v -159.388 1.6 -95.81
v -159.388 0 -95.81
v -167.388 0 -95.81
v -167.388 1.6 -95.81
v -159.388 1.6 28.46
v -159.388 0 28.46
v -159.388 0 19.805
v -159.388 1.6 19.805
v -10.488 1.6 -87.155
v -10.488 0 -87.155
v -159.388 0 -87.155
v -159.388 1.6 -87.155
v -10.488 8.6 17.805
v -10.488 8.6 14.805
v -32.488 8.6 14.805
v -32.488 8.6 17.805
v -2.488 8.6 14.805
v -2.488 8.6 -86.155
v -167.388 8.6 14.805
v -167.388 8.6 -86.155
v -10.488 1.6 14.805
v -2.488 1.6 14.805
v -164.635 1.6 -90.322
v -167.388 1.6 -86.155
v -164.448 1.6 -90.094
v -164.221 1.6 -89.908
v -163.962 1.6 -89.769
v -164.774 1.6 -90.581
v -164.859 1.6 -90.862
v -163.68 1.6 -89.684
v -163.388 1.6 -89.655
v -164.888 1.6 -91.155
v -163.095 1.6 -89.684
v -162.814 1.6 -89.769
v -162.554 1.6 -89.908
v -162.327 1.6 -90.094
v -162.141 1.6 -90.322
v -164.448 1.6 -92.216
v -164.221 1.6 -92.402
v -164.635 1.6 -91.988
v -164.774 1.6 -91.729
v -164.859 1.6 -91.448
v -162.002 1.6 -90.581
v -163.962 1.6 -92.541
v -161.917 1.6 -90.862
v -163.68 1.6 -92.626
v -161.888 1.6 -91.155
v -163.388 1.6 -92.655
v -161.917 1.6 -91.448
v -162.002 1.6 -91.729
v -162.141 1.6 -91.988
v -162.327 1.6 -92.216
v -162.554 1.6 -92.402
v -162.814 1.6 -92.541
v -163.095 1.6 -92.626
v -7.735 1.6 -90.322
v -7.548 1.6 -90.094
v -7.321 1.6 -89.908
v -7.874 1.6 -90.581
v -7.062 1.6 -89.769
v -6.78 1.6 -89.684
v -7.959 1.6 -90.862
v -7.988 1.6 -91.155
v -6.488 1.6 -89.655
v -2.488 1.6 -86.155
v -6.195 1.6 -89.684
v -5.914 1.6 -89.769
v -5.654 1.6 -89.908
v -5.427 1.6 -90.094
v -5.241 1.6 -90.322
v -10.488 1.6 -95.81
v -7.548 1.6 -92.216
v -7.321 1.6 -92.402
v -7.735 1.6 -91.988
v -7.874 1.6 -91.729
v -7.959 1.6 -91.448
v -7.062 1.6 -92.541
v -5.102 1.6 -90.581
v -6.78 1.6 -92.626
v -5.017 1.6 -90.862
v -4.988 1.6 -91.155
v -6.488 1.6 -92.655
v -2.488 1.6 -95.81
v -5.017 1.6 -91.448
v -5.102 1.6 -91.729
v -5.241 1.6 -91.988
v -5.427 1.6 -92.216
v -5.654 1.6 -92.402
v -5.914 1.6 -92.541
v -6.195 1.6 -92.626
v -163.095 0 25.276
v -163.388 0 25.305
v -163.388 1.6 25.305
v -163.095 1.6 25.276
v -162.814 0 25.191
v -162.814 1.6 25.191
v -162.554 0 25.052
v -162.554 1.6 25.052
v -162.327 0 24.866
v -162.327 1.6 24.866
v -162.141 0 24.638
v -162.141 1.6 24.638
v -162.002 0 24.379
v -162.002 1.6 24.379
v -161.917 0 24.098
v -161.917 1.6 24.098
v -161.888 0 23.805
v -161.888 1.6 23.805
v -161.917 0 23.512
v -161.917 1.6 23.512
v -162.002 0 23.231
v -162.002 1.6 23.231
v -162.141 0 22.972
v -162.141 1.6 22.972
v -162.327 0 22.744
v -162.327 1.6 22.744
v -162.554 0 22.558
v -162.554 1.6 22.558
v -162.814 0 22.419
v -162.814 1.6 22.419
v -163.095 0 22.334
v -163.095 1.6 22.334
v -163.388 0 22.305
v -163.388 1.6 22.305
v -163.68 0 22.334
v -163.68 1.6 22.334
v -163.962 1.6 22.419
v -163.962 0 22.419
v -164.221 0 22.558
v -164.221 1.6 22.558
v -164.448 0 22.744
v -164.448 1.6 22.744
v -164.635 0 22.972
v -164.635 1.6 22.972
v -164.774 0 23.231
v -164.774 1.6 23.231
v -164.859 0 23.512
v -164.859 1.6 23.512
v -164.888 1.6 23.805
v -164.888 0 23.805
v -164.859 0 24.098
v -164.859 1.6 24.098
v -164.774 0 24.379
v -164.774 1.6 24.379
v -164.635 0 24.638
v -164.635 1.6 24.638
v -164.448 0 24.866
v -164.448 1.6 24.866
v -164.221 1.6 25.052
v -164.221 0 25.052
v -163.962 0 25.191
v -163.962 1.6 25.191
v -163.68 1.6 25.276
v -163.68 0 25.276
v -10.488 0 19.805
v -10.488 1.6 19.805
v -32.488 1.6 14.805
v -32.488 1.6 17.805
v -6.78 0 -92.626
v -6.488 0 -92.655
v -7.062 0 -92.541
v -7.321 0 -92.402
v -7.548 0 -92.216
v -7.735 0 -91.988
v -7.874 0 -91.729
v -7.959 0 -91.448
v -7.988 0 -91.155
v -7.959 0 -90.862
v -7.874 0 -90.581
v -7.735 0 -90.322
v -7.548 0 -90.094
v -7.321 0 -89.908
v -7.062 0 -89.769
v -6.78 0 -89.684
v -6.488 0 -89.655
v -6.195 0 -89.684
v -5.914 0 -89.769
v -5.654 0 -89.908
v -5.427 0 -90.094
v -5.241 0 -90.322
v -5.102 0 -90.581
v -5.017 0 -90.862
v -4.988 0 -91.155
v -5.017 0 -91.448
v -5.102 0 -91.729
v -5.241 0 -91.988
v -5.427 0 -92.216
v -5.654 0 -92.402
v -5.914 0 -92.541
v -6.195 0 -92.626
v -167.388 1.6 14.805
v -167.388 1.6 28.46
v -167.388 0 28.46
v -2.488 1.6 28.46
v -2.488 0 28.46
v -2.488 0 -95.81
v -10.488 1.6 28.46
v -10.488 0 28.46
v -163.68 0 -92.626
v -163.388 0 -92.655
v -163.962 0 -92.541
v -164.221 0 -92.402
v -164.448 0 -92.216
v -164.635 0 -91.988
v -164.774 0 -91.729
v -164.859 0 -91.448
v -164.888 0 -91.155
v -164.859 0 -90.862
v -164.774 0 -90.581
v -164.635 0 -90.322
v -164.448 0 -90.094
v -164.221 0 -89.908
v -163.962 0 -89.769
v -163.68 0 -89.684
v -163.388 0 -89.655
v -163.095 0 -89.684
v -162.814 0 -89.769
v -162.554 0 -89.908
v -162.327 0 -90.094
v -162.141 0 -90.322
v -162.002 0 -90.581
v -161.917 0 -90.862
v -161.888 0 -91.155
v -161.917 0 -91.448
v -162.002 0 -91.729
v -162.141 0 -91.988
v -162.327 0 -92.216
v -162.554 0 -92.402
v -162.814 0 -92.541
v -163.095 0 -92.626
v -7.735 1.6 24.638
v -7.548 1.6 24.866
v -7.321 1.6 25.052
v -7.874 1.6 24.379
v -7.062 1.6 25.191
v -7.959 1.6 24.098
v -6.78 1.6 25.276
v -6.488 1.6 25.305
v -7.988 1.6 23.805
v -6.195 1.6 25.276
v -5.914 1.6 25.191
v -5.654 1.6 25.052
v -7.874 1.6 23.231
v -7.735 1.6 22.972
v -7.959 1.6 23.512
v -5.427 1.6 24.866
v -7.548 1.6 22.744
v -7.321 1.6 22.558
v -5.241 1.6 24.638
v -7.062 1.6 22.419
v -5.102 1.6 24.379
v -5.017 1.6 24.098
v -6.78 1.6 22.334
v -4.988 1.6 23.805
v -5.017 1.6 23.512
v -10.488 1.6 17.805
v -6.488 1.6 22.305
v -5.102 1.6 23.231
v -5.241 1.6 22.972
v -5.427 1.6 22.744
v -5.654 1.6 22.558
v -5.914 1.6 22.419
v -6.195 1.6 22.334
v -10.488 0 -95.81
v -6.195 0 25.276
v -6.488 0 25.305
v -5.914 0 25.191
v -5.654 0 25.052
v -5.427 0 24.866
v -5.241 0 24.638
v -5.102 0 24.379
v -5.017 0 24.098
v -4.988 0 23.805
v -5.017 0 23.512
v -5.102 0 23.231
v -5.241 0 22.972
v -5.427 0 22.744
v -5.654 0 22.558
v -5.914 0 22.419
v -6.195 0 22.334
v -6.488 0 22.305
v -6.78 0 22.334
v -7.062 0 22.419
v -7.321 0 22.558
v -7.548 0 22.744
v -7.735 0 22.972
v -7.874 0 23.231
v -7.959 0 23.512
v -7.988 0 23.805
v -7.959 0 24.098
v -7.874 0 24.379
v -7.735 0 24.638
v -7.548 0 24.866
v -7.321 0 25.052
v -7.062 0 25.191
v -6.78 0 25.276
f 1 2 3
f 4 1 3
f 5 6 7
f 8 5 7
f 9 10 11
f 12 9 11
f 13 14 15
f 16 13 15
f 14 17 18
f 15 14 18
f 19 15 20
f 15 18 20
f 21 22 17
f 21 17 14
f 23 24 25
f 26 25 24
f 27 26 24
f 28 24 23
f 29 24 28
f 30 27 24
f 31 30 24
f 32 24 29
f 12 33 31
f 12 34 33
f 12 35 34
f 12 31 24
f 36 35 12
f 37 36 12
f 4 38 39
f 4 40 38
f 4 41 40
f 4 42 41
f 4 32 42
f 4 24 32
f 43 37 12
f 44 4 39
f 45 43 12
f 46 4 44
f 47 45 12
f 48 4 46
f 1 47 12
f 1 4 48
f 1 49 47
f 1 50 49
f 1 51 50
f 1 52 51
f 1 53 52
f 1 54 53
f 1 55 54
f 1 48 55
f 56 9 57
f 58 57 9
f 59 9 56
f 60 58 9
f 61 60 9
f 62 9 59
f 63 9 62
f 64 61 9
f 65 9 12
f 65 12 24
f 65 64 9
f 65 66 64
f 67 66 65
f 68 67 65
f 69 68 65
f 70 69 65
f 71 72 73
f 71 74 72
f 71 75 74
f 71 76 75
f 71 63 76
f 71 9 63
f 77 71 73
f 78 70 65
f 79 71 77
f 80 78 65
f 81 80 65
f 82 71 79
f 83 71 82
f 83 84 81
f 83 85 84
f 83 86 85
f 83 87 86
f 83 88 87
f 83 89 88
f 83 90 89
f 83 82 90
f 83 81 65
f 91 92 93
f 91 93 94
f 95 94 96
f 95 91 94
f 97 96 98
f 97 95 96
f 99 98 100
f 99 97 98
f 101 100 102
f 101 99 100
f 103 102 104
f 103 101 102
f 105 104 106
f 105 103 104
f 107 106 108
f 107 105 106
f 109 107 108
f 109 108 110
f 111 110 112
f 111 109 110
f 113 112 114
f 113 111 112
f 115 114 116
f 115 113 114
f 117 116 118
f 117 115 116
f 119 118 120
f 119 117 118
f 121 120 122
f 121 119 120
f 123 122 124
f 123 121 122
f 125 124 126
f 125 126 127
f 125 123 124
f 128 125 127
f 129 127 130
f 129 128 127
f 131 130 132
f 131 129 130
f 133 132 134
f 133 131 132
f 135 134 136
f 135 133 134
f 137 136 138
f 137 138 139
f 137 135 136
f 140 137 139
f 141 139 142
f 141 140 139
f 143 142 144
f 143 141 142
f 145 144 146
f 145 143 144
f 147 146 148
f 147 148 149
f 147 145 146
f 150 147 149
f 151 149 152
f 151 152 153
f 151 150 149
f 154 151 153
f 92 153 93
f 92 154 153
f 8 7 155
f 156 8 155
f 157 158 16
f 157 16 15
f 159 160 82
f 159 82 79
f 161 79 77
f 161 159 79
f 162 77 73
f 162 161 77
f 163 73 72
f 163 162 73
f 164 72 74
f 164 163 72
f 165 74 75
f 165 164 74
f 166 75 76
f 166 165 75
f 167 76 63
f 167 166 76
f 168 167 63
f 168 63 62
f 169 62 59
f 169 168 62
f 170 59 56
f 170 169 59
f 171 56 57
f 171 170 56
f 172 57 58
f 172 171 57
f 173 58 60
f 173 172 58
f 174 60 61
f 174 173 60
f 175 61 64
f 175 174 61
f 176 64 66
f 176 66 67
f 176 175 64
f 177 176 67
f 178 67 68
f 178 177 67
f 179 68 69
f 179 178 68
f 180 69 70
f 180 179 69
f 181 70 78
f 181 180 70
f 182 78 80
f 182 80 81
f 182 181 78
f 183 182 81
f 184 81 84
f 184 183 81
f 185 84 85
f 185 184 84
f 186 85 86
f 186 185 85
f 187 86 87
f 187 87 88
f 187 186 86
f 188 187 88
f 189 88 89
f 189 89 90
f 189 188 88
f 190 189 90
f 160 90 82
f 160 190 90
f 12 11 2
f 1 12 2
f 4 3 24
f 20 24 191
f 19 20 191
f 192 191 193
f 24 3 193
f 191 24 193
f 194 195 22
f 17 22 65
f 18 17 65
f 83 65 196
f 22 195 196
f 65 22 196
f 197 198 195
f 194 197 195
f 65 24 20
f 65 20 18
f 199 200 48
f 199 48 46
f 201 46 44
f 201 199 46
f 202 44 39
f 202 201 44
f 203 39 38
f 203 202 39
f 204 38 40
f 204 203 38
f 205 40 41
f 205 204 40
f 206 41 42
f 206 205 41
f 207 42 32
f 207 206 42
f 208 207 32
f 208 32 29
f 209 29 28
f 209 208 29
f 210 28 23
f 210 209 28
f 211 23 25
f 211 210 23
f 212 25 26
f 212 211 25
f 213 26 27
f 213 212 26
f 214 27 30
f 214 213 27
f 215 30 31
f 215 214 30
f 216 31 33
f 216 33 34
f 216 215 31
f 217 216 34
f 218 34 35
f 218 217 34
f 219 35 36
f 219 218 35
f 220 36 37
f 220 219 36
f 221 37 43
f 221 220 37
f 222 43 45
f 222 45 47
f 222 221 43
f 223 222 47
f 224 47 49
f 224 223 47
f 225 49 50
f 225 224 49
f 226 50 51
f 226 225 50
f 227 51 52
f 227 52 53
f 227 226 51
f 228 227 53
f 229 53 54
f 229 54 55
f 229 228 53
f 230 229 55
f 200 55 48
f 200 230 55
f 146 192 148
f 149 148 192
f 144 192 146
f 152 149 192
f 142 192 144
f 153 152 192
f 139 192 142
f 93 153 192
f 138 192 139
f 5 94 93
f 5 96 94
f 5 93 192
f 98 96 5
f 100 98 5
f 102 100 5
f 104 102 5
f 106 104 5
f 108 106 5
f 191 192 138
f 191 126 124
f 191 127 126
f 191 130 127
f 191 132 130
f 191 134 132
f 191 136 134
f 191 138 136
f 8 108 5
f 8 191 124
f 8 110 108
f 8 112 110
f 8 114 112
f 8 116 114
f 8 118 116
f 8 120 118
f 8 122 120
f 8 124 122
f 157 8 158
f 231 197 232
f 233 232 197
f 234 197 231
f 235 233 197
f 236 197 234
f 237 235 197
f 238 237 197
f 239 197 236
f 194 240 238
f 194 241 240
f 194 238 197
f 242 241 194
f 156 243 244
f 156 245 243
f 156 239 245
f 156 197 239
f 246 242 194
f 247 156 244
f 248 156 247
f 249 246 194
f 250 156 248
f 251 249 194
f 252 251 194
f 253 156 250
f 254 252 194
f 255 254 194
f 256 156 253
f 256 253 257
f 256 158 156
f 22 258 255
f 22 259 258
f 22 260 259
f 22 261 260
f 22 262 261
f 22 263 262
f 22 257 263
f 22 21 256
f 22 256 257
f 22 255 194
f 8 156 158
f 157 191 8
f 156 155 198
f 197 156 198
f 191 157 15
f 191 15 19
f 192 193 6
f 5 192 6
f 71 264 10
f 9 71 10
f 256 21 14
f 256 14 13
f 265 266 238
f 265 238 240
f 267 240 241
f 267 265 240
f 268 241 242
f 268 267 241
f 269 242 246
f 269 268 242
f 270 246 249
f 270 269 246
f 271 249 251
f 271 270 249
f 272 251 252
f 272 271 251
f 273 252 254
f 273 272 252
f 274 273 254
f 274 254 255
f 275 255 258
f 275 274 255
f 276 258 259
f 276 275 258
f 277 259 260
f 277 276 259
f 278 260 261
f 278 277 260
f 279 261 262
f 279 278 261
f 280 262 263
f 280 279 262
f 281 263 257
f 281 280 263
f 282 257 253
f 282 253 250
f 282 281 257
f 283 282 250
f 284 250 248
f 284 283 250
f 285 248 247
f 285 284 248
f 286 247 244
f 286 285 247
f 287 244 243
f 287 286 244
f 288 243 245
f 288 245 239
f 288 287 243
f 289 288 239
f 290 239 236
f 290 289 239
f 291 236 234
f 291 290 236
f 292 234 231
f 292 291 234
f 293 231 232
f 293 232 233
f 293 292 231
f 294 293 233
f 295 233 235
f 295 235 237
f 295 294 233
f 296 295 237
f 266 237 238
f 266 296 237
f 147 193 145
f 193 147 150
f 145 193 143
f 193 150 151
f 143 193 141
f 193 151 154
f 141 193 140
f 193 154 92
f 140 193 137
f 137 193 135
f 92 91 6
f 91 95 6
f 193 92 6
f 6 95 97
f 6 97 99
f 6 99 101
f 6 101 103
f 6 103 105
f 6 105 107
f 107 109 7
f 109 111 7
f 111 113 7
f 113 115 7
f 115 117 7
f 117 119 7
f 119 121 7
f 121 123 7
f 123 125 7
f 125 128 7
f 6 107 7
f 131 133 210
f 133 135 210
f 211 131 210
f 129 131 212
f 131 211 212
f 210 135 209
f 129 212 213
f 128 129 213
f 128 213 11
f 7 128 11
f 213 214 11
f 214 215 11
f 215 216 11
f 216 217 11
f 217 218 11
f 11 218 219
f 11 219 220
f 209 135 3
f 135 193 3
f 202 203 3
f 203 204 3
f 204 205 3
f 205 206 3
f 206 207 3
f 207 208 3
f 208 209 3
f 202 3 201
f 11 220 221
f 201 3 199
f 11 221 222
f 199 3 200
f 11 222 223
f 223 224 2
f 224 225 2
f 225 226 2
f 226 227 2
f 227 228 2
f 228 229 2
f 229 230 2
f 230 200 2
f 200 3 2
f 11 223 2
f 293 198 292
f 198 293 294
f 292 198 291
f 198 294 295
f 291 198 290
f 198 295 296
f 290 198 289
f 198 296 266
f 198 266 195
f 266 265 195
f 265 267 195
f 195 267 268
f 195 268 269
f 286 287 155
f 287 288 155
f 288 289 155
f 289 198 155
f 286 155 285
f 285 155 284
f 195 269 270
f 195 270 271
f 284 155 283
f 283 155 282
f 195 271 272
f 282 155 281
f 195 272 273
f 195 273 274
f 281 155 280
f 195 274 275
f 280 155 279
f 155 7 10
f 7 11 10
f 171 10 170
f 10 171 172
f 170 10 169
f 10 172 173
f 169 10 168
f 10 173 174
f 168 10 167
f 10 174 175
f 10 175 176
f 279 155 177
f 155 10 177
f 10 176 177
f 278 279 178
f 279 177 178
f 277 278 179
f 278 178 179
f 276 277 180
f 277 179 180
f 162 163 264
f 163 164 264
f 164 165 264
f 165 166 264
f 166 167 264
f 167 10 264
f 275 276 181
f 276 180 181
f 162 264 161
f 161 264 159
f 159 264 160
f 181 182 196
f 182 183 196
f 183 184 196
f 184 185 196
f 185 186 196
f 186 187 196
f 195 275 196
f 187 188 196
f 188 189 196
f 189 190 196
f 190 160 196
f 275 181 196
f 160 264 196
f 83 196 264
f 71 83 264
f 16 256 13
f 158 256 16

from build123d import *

# Parameters (mm, degrees)
SKETCH1_R           = 1.5
BOSS_EXTRUDE1_DEPTH = 1.6
BOSS_EXTRUDE2_DEPTH = 7


with BuildPart() as part:
    # Sketch1 → Boss-Extrude1 (new body)
    with BuildSketch(Plane(origin=(0, 0, 0), x_dir=(1, 0, 0), z_dir=(0, 1, 0))):
        Polygon((-167.387715517, 87.155002586), (-167.387715517, -19.804997414), (-167.387715517, -28.459997414), (-159.387715517, -28.459997414), (-159.387715517, -19.804997414), (-10.487715517, -19.804997414), (-10.487715517, -28.459997414), (-2.487715517, -28.459997414), (-2.487715517, -19.804997414), (-2.487715517, 87.155002586), (-2.487715517, 95.810002586), (-10.487715517, 95.810002586), (-10.487715517, 87.155002586), (-159.387715517, 87.155002586), (-159.387715517, 95.810002586), (-167.387715517, 95.810002586), align=None)
        with Locations(Location((-6.487715517, -23.804997414, 0), (0, 0, 270))):
            Circle(SKETCH1_R, mode=Mode.SUBTRACT)
        with Locations(Location((-163.387715517, -23.804997414, 0), (0, 0, 270))):
            Circle(SKETCH1_R, mode=Mode.SUBTRACT)
        with Locations(Location((-6.487715517, 91.155002586, 0), (0, 0, 90))):
            Circle(SKETCH1_R, mode=Mode.SUBTRACT)
        with Locations(Location((-163.387715517, 91.155002586, 0), (0, 0, 90))):
            Circle(SKETCH1_R, mode=Mode.SUBTRACT)
    extrude(amount=BOSS_EXTRUDE1_DEPTH)

    # Sketch2 → Boss-Extrude2 (add)
    with BuildSketch(Plane(origin=(0, 1.6, 0), x_dir=(1, 0, 0), z_dir=(0, 1, 0))):
        Polygon((-167.387715517, 86.155002586), (-2.487715517, 86.155002586), (-2.487715517, -14.804997414), (-10.487715517, -14.804997414), (-10.487715517, -17.804997414), (-32.487715517, -17.804997414), (-32.487715517, -14.804997414), (-167.387715517, -14.804997414), align=None)
    extrude(amount=BOSS_EXTRUDE2_DEPTH)


solid = part.part
